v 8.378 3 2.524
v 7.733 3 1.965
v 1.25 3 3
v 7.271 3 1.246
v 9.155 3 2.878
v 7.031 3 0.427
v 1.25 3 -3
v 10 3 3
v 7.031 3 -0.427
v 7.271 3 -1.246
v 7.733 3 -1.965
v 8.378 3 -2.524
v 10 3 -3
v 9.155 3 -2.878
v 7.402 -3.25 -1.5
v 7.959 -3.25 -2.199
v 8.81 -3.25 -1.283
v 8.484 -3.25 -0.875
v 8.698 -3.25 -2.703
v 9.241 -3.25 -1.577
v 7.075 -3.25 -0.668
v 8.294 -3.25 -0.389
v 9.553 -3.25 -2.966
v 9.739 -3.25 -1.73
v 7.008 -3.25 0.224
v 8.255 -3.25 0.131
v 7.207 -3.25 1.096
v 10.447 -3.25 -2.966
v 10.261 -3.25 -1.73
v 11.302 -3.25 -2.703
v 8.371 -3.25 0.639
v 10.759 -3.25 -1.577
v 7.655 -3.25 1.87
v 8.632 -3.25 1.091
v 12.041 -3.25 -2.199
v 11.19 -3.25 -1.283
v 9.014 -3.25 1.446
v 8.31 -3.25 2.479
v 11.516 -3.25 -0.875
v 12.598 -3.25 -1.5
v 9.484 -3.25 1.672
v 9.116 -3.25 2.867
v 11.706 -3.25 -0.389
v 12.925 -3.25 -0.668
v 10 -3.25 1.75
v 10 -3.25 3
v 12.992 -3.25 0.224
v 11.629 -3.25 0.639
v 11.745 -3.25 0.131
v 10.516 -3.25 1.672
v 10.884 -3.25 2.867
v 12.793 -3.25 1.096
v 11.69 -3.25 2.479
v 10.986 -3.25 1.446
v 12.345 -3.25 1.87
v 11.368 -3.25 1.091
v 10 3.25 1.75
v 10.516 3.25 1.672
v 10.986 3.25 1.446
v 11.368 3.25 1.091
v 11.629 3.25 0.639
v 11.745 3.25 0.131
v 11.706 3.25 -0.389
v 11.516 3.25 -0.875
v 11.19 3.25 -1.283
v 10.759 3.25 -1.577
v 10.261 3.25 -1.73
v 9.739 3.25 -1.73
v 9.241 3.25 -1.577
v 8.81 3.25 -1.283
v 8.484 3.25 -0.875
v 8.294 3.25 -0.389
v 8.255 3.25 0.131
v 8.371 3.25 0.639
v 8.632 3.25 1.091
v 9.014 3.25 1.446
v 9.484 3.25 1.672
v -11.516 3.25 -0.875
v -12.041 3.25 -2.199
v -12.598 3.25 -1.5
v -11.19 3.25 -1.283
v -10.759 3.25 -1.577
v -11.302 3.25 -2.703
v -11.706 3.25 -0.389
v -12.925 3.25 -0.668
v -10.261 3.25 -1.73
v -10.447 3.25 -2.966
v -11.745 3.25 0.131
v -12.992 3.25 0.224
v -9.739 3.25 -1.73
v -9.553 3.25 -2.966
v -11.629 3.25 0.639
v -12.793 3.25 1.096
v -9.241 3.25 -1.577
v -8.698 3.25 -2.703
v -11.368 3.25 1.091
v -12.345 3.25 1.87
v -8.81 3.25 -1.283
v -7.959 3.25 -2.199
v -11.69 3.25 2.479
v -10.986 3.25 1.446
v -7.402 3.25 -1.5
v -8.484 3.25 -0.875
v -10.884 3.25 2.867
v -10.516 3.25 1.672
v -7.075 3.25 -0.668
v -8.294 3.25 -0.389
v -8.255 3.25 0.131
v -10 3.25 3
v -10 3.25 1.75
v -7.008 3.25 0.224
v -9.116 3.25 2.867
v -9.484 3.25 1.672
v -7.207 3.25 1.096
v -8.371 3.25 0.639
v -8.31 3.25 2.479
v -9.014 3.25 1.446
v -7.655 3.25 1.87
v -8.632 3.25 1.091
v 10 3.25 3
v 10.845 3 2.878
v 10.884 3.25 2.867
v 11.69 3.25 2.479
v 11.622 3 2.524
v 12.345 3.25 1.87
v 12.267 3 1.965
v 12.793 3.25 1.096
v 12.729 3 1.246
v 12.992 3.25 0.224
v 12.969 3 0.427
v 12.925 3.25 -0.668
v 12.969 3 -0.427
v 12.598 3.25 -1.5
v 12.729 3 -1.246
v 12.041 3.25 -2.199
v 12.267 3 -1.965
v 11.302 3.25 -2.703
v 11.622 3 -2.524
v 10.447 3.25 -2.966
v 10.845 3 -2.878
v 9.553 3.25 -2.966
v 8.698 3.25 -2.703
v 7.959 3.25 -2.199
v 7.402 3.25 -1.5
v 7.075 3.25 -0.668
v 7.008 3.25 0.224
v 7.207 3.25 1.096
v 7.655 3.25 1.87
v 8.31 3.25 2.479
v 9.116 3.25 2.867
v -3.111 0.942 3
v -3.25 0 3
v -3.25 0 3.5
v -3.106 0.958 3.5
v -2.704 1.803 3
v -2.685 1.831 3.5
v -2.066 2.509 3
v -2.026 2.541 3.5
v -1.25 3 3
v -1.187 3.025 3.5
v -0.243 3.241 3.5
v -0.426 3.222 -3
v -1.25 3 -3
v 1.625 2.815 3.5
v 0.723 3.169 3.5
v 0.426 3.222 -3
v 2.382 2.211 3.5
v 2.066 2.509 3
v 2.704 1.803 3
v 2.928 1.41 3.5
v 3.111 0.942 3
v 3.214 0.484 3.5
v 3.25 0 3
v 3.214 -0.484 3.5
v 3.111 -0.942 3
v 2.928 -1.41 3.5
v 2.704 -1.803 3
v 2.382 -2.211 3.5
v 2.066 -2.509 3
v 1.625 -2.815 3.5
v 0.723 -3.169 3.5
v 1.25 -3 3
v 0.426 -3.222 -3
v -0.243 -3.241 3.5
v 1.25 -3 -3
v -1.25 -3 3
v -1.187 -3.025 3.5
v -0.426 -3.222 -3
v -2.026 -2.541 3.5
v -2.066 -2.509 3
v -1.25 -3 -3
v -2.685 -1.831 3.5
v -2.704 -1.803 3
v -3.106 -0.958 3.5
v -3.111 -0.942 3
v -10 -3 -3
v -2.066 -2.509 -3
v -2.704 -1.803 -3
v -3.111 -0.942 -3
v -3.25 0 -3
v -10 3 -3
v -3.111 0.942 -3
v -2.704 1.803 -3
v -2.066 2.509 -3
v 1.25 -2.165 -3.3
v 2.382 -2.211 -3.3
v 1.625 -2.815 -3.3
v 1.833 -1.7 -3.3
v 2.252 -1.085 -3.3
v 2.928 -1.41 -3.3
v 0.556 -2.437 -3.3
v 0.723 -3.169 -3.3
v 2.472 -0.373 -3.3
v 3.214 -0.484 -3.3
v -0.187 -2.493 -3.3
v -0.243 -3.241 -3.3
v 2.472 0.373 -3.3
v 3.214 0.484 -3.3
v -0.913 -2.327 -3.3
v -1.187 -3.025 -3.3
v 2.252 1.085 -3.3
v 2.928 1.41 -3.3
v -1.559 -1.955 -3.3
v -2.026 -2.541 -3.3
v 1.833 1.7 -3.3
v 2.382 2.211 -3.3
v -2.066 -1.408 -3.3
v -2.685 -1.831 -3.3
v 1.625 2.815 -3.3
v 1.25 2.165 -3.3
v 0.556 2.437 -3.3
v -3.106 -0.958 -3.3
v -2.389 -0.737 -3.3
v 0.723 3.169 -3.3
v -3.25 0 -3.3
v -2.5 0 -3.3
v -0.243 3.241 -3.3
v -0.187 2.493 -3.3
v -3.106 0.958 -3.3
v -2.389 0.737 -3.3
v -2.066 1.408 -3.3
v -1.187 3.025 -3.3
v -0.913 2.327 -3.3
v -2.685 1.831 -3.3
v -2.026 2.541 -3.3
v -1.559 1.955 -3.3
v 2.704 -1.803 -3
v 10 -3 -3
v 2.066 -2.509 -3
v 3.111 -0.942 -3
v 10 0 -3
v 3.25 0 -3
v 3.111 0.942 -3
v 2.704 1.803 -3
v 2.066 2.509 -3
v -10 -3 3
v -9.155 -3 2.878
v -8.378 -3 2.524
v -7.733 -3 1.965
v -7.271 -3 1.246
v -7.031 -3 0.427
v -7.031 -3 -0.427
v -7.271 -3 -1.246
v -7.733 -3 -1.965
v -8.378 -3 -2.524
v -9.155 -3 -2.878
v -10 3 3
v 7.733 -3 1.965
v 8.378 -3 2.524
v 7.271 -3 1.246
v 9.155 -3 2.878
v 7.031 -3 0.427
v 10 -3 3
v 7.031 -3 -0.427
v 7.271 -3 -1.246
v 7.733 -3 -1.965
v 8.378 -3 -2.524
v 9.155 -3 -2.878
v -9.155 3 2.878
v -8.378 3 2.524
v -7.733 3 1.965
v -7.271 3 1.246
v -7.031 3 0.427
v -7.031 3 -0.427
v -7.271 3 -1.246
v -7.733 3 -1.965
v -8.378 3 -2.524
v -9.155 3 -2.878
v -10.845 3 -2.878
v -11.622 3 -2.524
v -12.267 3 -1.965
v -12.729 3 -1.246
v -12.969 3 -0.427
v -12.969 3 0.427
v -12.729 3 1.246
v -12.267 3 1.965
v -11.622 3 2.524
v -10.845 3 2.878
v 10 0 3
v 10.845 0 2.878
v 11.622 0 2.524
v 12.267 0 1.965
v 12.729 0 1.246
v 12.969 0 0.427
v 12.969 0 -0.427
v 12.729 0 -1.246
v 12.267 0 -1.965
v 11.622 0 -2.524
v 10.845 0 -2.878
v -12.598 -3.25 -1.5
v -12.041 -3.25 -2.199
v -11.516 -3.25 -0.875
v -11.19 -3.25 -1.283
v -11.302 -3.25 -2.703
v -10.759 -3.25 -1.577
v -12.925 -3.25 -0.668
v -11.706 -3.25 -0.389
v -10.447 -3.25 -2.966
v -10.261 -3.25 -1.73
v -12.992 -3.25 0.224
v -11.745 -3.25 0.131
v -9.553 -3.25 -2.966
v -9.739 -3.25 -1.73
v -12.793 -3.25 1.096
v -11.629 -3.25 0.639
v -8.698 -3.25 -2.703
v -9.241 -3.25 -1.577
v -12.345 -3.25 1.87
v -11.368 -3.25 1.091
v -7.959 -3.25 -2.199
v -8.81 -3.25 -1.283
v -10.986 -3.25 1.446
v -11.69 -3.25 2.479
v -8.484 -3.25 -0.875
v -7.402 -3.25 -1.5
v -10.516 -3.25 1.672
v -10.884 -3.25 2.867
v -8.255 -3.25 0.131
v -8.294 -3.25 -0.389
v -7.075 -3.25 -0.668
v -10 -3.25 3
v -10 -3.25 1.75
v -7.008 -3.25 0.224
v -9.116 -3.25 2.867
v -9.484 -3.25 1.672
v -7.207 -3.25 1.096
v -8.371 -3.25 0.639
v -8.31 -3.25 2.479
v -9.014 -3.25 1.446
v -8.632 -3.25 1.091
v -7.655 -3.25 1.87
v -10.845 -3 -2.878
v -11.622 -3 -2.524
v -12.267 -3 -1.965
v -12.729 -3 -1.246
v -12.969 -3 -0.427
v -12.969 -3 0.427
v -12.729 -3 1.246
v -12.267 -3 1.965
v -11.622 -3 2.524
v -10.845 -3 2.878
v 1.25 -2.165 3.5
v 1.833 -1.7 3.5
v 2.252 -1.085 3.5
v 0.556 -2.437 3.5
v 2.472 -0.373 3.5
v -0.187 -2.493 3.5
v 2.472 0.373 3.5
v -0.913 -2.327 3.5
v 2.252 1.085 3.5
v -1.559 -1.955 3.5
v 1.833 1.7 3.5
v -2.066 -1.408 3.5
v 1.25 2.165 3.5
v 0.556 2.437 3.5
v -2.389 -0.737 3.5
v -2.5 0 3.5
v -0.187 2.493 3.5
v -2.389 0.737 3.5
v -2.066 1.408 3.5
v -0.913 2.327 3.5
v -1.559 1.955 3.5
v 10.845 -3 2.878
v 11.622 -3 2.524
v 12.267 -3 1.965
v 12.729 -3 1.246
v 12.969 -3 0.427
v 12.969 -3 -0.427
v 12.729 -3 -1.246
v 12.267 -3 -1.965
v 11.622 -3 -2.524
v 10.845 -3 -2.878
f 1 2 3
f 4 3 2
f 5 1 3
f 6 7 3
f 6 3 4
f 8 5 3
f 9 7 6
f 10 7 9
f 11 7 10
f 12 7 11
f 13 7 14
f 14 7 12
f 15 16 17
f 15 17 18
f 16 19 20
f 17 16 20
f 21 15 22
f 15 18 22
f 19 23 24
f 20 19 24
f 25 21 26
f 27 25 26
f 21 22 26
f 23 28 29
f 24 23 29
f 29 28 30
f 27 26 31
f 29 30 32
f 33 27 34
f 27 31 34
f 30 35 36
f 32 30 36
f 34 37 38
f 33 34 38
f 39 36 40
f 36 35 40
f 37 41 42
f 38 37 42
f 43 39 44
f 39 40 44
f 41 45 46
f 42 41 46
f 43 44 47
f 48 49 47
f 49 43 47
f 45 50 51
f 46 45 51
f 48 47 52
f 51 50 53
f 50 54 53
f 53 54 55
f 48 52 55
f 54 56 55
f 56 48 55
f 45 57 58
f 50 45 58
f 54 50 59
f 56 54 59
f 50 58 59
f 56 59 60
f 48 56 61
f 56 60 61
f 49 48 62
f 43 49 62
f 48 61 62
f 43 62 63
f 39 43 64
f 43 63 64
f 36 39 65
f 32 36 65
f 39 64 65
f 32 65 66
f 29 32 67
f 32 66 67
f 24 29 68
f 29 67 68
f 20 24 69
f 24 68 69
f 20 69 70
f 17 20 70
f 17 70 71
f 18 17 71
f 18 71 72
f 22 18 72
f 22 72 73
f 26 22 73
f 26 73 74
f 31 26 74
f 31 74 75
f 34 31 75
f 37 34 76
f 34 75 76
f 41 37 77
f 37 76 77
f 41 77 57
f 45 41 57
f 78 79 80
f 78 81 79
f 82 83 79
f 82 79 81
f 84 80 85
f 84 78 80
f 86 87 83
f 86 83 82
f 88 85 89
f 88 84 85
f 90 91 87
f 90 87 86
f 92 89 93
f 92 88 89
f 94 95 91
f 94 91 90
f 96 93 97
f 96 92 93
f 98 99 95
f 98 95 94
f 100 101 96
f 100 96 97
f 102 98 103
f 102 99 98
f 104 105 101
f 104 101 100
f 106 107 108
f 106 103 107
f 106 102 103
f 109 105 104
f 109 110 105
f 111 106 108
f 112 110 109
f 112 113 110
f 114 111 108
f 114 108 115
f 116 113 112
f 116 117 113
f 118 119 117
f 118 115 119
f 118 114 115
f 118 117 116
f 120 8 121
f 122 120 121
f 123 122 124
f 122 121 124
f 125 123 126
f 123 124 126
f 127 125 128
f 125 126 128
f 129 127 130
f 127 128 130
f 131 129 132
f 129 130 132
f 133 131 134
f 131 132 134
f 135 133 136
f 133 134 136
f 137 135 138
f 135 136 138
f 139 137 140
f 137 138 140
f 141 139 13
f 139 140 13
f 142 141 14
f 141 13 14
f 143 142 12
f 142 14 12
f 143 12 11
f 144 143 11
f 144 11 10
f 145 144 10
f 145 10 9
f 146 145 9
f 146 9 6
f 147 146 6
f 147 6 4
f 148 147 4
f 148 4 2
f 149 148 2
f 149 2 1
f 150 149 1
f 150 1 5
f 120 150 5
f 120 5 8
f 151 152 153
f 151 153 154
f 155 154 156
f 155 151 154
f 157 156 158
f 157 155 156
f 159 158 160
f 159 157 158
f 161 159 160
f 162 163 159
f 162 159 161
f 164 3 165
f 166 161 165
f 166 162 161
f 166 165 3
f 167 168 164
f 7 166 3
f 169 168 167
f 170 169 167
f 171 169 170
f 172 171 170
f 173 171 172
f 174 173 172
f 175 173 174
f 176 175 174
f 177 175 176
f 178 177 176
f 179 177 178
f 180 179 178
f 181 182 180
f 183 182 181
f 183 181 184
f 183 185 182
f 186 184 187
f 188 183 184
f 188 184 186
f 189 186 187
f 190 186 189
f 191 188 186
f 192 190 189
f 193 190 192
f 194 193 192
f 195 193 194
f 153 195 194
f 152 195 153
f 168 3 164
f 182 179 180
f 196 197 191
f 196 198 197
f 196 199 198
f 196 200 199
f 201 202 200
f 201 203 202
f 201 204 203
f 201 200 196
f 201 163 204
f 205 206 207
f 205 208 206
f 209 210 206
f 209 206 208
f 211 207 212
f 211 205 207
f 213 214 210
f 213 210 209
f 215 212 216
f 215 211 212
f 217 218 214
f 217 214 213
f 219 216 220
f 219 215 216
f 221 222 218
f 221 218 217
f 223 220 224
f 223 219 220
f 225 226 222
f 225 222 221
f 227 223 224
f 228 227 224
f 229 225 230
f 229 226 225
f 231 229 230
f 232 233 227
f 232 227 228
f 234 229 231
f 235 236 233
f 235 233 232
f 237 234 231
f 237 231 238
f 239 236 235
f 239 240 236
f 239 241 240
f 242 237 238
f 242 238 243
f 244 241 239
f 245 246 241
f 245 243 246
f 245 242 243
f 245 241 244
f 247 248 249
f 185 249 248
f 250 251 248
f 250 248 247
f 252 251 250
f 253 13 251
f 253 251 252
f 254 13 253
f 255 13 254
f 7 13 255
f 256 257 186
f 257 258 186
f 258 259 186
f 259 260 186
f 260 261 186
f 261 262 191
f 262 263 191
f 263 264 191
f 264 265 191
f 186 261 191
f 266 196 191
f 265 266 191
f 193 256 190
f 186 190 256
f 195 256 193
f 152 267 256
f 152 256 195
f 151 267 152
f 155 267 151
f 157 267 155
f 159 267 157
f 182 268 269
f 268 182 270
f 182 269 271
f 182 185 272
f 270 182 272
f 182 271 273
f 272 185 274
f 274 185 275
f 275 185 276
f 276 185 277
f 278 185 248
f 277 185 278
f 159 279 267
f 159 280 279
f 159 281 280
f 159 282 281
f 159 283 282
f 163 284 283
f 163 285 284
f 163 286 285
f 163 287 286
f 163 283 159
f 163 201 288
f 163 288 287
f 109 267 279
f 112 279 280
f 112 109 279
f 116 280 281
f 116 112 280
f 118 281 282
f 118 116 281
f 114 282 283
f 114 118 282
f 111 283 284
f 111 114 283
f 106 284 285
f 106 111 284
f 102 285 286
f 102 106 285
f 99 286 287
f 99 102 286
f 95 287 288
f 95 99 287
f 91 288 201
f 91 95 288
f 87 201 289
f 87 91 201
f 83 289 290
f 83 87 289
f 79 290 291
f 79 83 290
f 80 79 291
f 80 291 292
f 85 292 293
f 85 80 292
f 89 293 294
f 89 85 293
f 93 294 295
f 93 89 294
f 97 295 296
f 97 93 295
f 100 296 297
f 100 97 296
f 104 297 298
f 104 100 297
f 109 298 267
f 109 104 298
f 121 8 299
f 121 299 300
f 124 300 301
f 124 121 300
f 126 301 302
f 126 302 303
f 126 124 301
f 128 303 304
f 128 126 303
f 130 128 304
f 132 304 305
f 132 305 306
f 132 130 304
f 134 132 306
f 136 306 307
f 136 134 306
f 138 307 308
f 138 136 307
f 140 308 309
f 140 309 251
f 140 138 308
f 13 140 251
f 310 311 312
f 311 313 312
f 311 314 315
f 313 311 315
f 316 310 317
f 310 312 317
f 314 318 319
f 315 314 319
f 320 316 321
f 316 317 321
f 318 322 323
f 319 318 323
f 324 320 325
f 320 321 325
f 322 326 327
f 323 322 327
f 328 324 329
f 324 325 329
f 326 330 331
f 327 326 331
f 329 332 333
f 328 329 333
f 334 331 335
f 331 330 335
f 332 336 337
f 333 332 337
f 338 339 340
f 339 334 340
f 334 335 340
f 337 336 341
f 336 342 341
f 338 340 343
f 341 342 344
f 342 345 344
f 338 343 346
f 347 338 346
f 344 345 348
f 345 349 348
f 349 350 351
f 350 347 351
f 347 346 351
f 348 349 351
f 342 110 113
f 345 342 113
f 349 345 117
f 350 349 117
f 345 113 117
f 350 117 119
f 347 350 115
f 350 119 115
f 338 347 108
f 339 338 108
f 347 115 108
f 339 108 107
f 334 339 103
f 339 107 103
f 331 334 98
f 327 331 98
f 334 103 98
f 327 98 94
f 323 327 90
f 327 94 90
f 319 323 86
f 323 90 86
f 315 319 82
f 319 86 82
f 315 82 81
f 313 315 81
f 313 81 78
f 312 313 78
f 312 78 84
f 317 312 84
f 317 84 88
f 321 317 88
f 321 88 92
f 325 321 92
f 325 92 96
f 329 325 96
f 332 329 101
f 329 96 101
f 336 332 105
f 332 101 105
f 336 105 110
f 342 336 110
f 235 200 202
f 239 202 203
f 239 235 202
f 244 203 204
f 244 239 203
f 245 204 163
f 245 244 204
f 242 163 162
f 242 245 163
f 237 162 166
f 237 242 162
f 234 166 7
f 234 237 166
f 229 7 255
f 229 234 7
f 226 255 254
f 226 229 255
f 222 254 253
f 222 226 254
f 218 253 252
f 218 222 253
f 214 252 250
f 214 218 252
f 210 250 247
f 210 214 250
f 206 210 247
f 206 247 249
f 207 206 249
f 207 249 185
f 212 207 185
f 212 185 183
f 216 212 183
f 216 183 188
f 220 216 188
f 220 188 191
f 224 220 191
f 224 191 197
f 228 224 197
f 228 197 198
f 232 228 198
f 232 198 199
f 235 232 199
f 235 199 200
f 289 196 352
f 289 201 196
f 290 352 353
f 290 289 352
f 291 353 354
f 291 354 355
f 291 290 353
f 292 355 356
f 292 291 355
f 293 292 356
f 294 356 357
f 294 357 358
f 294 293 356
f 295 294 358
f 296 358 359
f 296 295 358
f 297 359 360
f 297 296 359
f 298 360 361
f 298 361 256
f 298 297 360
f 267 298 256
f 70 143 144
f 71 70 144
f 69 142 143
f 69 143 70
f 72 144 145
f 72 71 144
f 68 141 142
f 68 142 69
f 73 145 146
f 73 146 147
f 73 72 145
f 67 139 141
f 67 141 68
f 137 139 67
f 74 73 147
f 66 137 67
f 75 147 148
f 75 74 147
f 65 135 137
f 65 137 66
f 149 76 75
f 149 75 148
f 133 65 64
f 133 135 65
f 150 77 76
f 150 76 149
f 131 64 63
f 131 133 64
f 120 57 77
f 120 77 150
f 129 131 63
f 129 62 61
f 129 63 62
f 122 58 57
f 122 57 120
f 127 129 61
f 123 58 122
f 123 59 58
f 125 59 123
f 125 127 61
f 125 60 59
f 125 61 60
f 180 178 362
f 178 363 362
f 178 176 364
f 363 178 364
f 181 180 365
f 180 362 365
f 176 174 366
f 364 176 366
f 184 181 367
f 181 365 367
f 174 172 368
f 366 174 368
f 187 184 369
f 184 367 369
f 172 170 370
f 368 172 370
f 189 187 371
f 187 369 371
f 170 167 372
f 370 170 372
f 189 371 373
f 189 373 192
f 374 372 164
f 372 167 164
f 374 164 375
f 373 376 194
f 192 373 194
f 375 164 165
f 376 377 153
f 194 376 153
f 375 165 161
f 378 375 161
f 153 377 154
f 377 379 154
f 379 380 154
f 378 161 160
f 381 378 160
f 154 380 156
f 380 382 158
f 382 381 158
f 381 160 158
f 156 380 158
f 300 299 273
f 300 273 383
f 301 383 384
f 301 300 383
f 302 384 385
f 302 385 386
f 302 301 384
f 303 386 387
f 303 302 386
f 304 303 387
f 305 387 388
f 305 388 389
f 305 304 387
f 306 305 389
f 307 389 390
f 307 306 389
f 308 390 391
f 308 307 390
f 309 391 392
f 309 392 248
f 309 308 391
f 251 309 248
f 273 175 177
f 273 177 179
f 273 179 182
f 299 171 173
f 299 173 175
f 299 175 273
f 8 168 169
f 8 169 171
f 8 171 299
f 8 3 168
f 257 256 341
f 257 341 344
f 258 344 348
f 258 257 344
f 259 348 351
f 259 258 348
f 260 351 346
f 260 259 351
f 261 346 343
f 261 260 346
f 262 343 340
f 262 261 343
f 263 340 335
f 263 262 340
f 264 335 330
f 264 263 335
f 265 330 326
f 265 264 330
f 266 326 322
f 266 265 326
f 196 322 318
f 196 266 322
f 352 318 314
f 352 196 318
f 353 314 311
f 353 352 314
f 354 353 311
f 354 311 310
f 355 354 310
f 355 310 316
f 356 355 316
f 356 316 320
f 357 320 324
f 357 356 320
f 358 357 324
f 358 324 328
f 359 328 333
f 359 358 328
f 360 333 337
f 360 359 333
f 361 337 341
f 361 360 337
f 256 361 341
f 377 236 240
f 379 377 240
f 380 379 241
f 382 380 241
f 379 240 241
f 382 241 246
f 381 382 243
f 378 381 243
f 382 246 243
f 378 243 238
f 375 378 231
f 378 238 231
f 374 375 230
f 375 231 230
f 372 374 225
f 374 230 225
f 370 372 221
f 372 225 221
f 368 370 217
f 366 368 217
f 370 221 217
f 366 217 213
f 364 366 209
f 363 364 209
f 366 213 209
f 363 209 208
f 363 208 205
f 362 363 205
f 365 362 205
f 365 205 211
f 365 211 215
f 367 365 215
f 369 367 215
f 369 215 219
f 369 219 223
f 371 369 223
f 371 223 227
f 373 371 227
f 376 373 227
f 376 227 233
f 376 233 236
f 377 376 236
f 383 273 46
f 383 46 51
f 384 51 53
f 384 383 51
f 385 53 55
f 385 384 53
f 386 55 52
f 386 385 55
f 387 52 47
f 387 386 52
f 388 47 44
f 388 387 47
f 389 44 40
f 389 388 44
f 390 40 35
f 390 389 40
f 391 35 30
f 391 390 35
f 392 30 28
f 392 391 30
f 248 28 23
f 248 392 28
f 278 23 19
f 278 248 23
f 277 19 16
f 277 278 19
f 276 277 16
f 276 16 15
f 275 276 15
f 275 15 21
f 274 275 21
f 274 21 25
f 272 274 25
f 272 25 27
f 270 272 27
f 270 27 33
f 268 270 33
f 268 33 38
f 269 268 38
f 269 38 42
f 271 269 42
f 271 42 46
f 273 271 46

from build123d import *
from build123d.topology import SkipClean

# Parameters (mm, degrees)
EXTRUDE_1_DEPTH     = 3
SKETCH_2_R          = 3
EXTRUDE_2_DEPTH     = 3.25
SKETCH_3_R          = 1.75
CUT_EXTRUDE_3_DEPTH = 6.5
SKETCH_4_R          = 3.25
EXTRUDE_5_DEPTH     = 6.5
EXTRUDE_START       = 0.3
SKETCH_6_R          = 3.25
EXTRUDE_6_DEPTH     = 0.3
SKETCH_7_R          = 2.5
CUT_EXTRUDE_7_DEPTH = 16.02672619


with BuildPart() as part:
    # 草图1 → 拉伸1 (new, symmetric)
    with BuildSketch(Plane(origin=(0, 0, 0), x_dir=(1, 0, 0), z_dir=(0, 1, 0))):
        with BuildLine():
            Line((-10, -3), (10, -3))
            ThreePointArc((10, -3), (13, 0), (10, 3))
            Line((10, 3), (-10, 3))
            ThreePointArc((-10, 3), (-13, 0), (-10, -3))
        make_face()
    extrude(amount=EXTRUDE_1_DEPTH, both=True)

    # 草图2 → 拉伸2 (add, symmetric)
    with SkipClean():  # the faces are left unmerged after this step: merging them gives an invalid solid
        with BuildSketch(Plane(origin=(0, 0, 0), x_dir=(1, 0, 0), z_dir=(0, 1, 0))):
            with Locations(Location((10, 0, 0), (0, 0, 270))):
                Circle(SKETCH_2_R)
            with Locations(Location((-10, 0, 0), (0, 0, 270))):
                Circle(SKETCH_2_R)
        extrude(amount=EXTRUDE_2_DEPTH, both=True)

    # 草图3 → 拉伸3 (cut)
    with SkipClean():  # the faces are left unmerged after this step: merging them gives an invalid solid
        with BuildSketch(Plane(origin=(0, 3.25, 0), x_dir=(1, 0, 0), z_dir=(0, 1, 0))):
            with Locations(Location((-10, 0, 0), (0, 0, 270))):
                Circle(SKETCH_3_R)
            with Locations(Location((10, 0, 0), (0, 0, 270))):
                Circle(SKETCH_3_R)
        extrude(amount=-CUT_EXTRUDE_3_DEPTH, mode=Mode.SUBTRACT)

    # 草图4 → 拉伸5 (add)
    with SkipClean():  # the faces are left unmerged after this step: merging them gives an invalid solid
        with BuildSketch(Plane(origin=(0, 0, -3), x_dir=(-1, 0, 0), z_dir=(0, 0, -1))):
            Circle(SKETCH_4_R)
        extrude(amount=-EXTRUDE_5_DEPTH)

    # 草图6 → 拉伸6 (add)
    with SkipClean():  # the faces are left unmerged after this step: merging them gives an invalid solid
        with BuildSketch(Plane(origin=(0, 0, -3), x_dir=(-1, 0, 0), z_dir=(0, 0, -1)).offset(EXTRUDE_START)):
            Circle(SKETCH_6_R)
        extrude(amount=-EXTRUDE_6_DEPTH)

    # 草图7 → 拉伸7 (cut, through all)
    with SkipClean():  # the faces are left unmerged after this step: merging them gives an invalid solid
        with BuildSketch(Plane(origin=(0, 0, -3.3), x_dir=(-1, 0, 0), z_dir=(0, 0, -1))):
            Circle(SKETCH_7_R)
        extrude(amount=-CUT_EXTRUDE_7_DEPTH, mode=Mode.SUBTRACT)


solid = part.part
